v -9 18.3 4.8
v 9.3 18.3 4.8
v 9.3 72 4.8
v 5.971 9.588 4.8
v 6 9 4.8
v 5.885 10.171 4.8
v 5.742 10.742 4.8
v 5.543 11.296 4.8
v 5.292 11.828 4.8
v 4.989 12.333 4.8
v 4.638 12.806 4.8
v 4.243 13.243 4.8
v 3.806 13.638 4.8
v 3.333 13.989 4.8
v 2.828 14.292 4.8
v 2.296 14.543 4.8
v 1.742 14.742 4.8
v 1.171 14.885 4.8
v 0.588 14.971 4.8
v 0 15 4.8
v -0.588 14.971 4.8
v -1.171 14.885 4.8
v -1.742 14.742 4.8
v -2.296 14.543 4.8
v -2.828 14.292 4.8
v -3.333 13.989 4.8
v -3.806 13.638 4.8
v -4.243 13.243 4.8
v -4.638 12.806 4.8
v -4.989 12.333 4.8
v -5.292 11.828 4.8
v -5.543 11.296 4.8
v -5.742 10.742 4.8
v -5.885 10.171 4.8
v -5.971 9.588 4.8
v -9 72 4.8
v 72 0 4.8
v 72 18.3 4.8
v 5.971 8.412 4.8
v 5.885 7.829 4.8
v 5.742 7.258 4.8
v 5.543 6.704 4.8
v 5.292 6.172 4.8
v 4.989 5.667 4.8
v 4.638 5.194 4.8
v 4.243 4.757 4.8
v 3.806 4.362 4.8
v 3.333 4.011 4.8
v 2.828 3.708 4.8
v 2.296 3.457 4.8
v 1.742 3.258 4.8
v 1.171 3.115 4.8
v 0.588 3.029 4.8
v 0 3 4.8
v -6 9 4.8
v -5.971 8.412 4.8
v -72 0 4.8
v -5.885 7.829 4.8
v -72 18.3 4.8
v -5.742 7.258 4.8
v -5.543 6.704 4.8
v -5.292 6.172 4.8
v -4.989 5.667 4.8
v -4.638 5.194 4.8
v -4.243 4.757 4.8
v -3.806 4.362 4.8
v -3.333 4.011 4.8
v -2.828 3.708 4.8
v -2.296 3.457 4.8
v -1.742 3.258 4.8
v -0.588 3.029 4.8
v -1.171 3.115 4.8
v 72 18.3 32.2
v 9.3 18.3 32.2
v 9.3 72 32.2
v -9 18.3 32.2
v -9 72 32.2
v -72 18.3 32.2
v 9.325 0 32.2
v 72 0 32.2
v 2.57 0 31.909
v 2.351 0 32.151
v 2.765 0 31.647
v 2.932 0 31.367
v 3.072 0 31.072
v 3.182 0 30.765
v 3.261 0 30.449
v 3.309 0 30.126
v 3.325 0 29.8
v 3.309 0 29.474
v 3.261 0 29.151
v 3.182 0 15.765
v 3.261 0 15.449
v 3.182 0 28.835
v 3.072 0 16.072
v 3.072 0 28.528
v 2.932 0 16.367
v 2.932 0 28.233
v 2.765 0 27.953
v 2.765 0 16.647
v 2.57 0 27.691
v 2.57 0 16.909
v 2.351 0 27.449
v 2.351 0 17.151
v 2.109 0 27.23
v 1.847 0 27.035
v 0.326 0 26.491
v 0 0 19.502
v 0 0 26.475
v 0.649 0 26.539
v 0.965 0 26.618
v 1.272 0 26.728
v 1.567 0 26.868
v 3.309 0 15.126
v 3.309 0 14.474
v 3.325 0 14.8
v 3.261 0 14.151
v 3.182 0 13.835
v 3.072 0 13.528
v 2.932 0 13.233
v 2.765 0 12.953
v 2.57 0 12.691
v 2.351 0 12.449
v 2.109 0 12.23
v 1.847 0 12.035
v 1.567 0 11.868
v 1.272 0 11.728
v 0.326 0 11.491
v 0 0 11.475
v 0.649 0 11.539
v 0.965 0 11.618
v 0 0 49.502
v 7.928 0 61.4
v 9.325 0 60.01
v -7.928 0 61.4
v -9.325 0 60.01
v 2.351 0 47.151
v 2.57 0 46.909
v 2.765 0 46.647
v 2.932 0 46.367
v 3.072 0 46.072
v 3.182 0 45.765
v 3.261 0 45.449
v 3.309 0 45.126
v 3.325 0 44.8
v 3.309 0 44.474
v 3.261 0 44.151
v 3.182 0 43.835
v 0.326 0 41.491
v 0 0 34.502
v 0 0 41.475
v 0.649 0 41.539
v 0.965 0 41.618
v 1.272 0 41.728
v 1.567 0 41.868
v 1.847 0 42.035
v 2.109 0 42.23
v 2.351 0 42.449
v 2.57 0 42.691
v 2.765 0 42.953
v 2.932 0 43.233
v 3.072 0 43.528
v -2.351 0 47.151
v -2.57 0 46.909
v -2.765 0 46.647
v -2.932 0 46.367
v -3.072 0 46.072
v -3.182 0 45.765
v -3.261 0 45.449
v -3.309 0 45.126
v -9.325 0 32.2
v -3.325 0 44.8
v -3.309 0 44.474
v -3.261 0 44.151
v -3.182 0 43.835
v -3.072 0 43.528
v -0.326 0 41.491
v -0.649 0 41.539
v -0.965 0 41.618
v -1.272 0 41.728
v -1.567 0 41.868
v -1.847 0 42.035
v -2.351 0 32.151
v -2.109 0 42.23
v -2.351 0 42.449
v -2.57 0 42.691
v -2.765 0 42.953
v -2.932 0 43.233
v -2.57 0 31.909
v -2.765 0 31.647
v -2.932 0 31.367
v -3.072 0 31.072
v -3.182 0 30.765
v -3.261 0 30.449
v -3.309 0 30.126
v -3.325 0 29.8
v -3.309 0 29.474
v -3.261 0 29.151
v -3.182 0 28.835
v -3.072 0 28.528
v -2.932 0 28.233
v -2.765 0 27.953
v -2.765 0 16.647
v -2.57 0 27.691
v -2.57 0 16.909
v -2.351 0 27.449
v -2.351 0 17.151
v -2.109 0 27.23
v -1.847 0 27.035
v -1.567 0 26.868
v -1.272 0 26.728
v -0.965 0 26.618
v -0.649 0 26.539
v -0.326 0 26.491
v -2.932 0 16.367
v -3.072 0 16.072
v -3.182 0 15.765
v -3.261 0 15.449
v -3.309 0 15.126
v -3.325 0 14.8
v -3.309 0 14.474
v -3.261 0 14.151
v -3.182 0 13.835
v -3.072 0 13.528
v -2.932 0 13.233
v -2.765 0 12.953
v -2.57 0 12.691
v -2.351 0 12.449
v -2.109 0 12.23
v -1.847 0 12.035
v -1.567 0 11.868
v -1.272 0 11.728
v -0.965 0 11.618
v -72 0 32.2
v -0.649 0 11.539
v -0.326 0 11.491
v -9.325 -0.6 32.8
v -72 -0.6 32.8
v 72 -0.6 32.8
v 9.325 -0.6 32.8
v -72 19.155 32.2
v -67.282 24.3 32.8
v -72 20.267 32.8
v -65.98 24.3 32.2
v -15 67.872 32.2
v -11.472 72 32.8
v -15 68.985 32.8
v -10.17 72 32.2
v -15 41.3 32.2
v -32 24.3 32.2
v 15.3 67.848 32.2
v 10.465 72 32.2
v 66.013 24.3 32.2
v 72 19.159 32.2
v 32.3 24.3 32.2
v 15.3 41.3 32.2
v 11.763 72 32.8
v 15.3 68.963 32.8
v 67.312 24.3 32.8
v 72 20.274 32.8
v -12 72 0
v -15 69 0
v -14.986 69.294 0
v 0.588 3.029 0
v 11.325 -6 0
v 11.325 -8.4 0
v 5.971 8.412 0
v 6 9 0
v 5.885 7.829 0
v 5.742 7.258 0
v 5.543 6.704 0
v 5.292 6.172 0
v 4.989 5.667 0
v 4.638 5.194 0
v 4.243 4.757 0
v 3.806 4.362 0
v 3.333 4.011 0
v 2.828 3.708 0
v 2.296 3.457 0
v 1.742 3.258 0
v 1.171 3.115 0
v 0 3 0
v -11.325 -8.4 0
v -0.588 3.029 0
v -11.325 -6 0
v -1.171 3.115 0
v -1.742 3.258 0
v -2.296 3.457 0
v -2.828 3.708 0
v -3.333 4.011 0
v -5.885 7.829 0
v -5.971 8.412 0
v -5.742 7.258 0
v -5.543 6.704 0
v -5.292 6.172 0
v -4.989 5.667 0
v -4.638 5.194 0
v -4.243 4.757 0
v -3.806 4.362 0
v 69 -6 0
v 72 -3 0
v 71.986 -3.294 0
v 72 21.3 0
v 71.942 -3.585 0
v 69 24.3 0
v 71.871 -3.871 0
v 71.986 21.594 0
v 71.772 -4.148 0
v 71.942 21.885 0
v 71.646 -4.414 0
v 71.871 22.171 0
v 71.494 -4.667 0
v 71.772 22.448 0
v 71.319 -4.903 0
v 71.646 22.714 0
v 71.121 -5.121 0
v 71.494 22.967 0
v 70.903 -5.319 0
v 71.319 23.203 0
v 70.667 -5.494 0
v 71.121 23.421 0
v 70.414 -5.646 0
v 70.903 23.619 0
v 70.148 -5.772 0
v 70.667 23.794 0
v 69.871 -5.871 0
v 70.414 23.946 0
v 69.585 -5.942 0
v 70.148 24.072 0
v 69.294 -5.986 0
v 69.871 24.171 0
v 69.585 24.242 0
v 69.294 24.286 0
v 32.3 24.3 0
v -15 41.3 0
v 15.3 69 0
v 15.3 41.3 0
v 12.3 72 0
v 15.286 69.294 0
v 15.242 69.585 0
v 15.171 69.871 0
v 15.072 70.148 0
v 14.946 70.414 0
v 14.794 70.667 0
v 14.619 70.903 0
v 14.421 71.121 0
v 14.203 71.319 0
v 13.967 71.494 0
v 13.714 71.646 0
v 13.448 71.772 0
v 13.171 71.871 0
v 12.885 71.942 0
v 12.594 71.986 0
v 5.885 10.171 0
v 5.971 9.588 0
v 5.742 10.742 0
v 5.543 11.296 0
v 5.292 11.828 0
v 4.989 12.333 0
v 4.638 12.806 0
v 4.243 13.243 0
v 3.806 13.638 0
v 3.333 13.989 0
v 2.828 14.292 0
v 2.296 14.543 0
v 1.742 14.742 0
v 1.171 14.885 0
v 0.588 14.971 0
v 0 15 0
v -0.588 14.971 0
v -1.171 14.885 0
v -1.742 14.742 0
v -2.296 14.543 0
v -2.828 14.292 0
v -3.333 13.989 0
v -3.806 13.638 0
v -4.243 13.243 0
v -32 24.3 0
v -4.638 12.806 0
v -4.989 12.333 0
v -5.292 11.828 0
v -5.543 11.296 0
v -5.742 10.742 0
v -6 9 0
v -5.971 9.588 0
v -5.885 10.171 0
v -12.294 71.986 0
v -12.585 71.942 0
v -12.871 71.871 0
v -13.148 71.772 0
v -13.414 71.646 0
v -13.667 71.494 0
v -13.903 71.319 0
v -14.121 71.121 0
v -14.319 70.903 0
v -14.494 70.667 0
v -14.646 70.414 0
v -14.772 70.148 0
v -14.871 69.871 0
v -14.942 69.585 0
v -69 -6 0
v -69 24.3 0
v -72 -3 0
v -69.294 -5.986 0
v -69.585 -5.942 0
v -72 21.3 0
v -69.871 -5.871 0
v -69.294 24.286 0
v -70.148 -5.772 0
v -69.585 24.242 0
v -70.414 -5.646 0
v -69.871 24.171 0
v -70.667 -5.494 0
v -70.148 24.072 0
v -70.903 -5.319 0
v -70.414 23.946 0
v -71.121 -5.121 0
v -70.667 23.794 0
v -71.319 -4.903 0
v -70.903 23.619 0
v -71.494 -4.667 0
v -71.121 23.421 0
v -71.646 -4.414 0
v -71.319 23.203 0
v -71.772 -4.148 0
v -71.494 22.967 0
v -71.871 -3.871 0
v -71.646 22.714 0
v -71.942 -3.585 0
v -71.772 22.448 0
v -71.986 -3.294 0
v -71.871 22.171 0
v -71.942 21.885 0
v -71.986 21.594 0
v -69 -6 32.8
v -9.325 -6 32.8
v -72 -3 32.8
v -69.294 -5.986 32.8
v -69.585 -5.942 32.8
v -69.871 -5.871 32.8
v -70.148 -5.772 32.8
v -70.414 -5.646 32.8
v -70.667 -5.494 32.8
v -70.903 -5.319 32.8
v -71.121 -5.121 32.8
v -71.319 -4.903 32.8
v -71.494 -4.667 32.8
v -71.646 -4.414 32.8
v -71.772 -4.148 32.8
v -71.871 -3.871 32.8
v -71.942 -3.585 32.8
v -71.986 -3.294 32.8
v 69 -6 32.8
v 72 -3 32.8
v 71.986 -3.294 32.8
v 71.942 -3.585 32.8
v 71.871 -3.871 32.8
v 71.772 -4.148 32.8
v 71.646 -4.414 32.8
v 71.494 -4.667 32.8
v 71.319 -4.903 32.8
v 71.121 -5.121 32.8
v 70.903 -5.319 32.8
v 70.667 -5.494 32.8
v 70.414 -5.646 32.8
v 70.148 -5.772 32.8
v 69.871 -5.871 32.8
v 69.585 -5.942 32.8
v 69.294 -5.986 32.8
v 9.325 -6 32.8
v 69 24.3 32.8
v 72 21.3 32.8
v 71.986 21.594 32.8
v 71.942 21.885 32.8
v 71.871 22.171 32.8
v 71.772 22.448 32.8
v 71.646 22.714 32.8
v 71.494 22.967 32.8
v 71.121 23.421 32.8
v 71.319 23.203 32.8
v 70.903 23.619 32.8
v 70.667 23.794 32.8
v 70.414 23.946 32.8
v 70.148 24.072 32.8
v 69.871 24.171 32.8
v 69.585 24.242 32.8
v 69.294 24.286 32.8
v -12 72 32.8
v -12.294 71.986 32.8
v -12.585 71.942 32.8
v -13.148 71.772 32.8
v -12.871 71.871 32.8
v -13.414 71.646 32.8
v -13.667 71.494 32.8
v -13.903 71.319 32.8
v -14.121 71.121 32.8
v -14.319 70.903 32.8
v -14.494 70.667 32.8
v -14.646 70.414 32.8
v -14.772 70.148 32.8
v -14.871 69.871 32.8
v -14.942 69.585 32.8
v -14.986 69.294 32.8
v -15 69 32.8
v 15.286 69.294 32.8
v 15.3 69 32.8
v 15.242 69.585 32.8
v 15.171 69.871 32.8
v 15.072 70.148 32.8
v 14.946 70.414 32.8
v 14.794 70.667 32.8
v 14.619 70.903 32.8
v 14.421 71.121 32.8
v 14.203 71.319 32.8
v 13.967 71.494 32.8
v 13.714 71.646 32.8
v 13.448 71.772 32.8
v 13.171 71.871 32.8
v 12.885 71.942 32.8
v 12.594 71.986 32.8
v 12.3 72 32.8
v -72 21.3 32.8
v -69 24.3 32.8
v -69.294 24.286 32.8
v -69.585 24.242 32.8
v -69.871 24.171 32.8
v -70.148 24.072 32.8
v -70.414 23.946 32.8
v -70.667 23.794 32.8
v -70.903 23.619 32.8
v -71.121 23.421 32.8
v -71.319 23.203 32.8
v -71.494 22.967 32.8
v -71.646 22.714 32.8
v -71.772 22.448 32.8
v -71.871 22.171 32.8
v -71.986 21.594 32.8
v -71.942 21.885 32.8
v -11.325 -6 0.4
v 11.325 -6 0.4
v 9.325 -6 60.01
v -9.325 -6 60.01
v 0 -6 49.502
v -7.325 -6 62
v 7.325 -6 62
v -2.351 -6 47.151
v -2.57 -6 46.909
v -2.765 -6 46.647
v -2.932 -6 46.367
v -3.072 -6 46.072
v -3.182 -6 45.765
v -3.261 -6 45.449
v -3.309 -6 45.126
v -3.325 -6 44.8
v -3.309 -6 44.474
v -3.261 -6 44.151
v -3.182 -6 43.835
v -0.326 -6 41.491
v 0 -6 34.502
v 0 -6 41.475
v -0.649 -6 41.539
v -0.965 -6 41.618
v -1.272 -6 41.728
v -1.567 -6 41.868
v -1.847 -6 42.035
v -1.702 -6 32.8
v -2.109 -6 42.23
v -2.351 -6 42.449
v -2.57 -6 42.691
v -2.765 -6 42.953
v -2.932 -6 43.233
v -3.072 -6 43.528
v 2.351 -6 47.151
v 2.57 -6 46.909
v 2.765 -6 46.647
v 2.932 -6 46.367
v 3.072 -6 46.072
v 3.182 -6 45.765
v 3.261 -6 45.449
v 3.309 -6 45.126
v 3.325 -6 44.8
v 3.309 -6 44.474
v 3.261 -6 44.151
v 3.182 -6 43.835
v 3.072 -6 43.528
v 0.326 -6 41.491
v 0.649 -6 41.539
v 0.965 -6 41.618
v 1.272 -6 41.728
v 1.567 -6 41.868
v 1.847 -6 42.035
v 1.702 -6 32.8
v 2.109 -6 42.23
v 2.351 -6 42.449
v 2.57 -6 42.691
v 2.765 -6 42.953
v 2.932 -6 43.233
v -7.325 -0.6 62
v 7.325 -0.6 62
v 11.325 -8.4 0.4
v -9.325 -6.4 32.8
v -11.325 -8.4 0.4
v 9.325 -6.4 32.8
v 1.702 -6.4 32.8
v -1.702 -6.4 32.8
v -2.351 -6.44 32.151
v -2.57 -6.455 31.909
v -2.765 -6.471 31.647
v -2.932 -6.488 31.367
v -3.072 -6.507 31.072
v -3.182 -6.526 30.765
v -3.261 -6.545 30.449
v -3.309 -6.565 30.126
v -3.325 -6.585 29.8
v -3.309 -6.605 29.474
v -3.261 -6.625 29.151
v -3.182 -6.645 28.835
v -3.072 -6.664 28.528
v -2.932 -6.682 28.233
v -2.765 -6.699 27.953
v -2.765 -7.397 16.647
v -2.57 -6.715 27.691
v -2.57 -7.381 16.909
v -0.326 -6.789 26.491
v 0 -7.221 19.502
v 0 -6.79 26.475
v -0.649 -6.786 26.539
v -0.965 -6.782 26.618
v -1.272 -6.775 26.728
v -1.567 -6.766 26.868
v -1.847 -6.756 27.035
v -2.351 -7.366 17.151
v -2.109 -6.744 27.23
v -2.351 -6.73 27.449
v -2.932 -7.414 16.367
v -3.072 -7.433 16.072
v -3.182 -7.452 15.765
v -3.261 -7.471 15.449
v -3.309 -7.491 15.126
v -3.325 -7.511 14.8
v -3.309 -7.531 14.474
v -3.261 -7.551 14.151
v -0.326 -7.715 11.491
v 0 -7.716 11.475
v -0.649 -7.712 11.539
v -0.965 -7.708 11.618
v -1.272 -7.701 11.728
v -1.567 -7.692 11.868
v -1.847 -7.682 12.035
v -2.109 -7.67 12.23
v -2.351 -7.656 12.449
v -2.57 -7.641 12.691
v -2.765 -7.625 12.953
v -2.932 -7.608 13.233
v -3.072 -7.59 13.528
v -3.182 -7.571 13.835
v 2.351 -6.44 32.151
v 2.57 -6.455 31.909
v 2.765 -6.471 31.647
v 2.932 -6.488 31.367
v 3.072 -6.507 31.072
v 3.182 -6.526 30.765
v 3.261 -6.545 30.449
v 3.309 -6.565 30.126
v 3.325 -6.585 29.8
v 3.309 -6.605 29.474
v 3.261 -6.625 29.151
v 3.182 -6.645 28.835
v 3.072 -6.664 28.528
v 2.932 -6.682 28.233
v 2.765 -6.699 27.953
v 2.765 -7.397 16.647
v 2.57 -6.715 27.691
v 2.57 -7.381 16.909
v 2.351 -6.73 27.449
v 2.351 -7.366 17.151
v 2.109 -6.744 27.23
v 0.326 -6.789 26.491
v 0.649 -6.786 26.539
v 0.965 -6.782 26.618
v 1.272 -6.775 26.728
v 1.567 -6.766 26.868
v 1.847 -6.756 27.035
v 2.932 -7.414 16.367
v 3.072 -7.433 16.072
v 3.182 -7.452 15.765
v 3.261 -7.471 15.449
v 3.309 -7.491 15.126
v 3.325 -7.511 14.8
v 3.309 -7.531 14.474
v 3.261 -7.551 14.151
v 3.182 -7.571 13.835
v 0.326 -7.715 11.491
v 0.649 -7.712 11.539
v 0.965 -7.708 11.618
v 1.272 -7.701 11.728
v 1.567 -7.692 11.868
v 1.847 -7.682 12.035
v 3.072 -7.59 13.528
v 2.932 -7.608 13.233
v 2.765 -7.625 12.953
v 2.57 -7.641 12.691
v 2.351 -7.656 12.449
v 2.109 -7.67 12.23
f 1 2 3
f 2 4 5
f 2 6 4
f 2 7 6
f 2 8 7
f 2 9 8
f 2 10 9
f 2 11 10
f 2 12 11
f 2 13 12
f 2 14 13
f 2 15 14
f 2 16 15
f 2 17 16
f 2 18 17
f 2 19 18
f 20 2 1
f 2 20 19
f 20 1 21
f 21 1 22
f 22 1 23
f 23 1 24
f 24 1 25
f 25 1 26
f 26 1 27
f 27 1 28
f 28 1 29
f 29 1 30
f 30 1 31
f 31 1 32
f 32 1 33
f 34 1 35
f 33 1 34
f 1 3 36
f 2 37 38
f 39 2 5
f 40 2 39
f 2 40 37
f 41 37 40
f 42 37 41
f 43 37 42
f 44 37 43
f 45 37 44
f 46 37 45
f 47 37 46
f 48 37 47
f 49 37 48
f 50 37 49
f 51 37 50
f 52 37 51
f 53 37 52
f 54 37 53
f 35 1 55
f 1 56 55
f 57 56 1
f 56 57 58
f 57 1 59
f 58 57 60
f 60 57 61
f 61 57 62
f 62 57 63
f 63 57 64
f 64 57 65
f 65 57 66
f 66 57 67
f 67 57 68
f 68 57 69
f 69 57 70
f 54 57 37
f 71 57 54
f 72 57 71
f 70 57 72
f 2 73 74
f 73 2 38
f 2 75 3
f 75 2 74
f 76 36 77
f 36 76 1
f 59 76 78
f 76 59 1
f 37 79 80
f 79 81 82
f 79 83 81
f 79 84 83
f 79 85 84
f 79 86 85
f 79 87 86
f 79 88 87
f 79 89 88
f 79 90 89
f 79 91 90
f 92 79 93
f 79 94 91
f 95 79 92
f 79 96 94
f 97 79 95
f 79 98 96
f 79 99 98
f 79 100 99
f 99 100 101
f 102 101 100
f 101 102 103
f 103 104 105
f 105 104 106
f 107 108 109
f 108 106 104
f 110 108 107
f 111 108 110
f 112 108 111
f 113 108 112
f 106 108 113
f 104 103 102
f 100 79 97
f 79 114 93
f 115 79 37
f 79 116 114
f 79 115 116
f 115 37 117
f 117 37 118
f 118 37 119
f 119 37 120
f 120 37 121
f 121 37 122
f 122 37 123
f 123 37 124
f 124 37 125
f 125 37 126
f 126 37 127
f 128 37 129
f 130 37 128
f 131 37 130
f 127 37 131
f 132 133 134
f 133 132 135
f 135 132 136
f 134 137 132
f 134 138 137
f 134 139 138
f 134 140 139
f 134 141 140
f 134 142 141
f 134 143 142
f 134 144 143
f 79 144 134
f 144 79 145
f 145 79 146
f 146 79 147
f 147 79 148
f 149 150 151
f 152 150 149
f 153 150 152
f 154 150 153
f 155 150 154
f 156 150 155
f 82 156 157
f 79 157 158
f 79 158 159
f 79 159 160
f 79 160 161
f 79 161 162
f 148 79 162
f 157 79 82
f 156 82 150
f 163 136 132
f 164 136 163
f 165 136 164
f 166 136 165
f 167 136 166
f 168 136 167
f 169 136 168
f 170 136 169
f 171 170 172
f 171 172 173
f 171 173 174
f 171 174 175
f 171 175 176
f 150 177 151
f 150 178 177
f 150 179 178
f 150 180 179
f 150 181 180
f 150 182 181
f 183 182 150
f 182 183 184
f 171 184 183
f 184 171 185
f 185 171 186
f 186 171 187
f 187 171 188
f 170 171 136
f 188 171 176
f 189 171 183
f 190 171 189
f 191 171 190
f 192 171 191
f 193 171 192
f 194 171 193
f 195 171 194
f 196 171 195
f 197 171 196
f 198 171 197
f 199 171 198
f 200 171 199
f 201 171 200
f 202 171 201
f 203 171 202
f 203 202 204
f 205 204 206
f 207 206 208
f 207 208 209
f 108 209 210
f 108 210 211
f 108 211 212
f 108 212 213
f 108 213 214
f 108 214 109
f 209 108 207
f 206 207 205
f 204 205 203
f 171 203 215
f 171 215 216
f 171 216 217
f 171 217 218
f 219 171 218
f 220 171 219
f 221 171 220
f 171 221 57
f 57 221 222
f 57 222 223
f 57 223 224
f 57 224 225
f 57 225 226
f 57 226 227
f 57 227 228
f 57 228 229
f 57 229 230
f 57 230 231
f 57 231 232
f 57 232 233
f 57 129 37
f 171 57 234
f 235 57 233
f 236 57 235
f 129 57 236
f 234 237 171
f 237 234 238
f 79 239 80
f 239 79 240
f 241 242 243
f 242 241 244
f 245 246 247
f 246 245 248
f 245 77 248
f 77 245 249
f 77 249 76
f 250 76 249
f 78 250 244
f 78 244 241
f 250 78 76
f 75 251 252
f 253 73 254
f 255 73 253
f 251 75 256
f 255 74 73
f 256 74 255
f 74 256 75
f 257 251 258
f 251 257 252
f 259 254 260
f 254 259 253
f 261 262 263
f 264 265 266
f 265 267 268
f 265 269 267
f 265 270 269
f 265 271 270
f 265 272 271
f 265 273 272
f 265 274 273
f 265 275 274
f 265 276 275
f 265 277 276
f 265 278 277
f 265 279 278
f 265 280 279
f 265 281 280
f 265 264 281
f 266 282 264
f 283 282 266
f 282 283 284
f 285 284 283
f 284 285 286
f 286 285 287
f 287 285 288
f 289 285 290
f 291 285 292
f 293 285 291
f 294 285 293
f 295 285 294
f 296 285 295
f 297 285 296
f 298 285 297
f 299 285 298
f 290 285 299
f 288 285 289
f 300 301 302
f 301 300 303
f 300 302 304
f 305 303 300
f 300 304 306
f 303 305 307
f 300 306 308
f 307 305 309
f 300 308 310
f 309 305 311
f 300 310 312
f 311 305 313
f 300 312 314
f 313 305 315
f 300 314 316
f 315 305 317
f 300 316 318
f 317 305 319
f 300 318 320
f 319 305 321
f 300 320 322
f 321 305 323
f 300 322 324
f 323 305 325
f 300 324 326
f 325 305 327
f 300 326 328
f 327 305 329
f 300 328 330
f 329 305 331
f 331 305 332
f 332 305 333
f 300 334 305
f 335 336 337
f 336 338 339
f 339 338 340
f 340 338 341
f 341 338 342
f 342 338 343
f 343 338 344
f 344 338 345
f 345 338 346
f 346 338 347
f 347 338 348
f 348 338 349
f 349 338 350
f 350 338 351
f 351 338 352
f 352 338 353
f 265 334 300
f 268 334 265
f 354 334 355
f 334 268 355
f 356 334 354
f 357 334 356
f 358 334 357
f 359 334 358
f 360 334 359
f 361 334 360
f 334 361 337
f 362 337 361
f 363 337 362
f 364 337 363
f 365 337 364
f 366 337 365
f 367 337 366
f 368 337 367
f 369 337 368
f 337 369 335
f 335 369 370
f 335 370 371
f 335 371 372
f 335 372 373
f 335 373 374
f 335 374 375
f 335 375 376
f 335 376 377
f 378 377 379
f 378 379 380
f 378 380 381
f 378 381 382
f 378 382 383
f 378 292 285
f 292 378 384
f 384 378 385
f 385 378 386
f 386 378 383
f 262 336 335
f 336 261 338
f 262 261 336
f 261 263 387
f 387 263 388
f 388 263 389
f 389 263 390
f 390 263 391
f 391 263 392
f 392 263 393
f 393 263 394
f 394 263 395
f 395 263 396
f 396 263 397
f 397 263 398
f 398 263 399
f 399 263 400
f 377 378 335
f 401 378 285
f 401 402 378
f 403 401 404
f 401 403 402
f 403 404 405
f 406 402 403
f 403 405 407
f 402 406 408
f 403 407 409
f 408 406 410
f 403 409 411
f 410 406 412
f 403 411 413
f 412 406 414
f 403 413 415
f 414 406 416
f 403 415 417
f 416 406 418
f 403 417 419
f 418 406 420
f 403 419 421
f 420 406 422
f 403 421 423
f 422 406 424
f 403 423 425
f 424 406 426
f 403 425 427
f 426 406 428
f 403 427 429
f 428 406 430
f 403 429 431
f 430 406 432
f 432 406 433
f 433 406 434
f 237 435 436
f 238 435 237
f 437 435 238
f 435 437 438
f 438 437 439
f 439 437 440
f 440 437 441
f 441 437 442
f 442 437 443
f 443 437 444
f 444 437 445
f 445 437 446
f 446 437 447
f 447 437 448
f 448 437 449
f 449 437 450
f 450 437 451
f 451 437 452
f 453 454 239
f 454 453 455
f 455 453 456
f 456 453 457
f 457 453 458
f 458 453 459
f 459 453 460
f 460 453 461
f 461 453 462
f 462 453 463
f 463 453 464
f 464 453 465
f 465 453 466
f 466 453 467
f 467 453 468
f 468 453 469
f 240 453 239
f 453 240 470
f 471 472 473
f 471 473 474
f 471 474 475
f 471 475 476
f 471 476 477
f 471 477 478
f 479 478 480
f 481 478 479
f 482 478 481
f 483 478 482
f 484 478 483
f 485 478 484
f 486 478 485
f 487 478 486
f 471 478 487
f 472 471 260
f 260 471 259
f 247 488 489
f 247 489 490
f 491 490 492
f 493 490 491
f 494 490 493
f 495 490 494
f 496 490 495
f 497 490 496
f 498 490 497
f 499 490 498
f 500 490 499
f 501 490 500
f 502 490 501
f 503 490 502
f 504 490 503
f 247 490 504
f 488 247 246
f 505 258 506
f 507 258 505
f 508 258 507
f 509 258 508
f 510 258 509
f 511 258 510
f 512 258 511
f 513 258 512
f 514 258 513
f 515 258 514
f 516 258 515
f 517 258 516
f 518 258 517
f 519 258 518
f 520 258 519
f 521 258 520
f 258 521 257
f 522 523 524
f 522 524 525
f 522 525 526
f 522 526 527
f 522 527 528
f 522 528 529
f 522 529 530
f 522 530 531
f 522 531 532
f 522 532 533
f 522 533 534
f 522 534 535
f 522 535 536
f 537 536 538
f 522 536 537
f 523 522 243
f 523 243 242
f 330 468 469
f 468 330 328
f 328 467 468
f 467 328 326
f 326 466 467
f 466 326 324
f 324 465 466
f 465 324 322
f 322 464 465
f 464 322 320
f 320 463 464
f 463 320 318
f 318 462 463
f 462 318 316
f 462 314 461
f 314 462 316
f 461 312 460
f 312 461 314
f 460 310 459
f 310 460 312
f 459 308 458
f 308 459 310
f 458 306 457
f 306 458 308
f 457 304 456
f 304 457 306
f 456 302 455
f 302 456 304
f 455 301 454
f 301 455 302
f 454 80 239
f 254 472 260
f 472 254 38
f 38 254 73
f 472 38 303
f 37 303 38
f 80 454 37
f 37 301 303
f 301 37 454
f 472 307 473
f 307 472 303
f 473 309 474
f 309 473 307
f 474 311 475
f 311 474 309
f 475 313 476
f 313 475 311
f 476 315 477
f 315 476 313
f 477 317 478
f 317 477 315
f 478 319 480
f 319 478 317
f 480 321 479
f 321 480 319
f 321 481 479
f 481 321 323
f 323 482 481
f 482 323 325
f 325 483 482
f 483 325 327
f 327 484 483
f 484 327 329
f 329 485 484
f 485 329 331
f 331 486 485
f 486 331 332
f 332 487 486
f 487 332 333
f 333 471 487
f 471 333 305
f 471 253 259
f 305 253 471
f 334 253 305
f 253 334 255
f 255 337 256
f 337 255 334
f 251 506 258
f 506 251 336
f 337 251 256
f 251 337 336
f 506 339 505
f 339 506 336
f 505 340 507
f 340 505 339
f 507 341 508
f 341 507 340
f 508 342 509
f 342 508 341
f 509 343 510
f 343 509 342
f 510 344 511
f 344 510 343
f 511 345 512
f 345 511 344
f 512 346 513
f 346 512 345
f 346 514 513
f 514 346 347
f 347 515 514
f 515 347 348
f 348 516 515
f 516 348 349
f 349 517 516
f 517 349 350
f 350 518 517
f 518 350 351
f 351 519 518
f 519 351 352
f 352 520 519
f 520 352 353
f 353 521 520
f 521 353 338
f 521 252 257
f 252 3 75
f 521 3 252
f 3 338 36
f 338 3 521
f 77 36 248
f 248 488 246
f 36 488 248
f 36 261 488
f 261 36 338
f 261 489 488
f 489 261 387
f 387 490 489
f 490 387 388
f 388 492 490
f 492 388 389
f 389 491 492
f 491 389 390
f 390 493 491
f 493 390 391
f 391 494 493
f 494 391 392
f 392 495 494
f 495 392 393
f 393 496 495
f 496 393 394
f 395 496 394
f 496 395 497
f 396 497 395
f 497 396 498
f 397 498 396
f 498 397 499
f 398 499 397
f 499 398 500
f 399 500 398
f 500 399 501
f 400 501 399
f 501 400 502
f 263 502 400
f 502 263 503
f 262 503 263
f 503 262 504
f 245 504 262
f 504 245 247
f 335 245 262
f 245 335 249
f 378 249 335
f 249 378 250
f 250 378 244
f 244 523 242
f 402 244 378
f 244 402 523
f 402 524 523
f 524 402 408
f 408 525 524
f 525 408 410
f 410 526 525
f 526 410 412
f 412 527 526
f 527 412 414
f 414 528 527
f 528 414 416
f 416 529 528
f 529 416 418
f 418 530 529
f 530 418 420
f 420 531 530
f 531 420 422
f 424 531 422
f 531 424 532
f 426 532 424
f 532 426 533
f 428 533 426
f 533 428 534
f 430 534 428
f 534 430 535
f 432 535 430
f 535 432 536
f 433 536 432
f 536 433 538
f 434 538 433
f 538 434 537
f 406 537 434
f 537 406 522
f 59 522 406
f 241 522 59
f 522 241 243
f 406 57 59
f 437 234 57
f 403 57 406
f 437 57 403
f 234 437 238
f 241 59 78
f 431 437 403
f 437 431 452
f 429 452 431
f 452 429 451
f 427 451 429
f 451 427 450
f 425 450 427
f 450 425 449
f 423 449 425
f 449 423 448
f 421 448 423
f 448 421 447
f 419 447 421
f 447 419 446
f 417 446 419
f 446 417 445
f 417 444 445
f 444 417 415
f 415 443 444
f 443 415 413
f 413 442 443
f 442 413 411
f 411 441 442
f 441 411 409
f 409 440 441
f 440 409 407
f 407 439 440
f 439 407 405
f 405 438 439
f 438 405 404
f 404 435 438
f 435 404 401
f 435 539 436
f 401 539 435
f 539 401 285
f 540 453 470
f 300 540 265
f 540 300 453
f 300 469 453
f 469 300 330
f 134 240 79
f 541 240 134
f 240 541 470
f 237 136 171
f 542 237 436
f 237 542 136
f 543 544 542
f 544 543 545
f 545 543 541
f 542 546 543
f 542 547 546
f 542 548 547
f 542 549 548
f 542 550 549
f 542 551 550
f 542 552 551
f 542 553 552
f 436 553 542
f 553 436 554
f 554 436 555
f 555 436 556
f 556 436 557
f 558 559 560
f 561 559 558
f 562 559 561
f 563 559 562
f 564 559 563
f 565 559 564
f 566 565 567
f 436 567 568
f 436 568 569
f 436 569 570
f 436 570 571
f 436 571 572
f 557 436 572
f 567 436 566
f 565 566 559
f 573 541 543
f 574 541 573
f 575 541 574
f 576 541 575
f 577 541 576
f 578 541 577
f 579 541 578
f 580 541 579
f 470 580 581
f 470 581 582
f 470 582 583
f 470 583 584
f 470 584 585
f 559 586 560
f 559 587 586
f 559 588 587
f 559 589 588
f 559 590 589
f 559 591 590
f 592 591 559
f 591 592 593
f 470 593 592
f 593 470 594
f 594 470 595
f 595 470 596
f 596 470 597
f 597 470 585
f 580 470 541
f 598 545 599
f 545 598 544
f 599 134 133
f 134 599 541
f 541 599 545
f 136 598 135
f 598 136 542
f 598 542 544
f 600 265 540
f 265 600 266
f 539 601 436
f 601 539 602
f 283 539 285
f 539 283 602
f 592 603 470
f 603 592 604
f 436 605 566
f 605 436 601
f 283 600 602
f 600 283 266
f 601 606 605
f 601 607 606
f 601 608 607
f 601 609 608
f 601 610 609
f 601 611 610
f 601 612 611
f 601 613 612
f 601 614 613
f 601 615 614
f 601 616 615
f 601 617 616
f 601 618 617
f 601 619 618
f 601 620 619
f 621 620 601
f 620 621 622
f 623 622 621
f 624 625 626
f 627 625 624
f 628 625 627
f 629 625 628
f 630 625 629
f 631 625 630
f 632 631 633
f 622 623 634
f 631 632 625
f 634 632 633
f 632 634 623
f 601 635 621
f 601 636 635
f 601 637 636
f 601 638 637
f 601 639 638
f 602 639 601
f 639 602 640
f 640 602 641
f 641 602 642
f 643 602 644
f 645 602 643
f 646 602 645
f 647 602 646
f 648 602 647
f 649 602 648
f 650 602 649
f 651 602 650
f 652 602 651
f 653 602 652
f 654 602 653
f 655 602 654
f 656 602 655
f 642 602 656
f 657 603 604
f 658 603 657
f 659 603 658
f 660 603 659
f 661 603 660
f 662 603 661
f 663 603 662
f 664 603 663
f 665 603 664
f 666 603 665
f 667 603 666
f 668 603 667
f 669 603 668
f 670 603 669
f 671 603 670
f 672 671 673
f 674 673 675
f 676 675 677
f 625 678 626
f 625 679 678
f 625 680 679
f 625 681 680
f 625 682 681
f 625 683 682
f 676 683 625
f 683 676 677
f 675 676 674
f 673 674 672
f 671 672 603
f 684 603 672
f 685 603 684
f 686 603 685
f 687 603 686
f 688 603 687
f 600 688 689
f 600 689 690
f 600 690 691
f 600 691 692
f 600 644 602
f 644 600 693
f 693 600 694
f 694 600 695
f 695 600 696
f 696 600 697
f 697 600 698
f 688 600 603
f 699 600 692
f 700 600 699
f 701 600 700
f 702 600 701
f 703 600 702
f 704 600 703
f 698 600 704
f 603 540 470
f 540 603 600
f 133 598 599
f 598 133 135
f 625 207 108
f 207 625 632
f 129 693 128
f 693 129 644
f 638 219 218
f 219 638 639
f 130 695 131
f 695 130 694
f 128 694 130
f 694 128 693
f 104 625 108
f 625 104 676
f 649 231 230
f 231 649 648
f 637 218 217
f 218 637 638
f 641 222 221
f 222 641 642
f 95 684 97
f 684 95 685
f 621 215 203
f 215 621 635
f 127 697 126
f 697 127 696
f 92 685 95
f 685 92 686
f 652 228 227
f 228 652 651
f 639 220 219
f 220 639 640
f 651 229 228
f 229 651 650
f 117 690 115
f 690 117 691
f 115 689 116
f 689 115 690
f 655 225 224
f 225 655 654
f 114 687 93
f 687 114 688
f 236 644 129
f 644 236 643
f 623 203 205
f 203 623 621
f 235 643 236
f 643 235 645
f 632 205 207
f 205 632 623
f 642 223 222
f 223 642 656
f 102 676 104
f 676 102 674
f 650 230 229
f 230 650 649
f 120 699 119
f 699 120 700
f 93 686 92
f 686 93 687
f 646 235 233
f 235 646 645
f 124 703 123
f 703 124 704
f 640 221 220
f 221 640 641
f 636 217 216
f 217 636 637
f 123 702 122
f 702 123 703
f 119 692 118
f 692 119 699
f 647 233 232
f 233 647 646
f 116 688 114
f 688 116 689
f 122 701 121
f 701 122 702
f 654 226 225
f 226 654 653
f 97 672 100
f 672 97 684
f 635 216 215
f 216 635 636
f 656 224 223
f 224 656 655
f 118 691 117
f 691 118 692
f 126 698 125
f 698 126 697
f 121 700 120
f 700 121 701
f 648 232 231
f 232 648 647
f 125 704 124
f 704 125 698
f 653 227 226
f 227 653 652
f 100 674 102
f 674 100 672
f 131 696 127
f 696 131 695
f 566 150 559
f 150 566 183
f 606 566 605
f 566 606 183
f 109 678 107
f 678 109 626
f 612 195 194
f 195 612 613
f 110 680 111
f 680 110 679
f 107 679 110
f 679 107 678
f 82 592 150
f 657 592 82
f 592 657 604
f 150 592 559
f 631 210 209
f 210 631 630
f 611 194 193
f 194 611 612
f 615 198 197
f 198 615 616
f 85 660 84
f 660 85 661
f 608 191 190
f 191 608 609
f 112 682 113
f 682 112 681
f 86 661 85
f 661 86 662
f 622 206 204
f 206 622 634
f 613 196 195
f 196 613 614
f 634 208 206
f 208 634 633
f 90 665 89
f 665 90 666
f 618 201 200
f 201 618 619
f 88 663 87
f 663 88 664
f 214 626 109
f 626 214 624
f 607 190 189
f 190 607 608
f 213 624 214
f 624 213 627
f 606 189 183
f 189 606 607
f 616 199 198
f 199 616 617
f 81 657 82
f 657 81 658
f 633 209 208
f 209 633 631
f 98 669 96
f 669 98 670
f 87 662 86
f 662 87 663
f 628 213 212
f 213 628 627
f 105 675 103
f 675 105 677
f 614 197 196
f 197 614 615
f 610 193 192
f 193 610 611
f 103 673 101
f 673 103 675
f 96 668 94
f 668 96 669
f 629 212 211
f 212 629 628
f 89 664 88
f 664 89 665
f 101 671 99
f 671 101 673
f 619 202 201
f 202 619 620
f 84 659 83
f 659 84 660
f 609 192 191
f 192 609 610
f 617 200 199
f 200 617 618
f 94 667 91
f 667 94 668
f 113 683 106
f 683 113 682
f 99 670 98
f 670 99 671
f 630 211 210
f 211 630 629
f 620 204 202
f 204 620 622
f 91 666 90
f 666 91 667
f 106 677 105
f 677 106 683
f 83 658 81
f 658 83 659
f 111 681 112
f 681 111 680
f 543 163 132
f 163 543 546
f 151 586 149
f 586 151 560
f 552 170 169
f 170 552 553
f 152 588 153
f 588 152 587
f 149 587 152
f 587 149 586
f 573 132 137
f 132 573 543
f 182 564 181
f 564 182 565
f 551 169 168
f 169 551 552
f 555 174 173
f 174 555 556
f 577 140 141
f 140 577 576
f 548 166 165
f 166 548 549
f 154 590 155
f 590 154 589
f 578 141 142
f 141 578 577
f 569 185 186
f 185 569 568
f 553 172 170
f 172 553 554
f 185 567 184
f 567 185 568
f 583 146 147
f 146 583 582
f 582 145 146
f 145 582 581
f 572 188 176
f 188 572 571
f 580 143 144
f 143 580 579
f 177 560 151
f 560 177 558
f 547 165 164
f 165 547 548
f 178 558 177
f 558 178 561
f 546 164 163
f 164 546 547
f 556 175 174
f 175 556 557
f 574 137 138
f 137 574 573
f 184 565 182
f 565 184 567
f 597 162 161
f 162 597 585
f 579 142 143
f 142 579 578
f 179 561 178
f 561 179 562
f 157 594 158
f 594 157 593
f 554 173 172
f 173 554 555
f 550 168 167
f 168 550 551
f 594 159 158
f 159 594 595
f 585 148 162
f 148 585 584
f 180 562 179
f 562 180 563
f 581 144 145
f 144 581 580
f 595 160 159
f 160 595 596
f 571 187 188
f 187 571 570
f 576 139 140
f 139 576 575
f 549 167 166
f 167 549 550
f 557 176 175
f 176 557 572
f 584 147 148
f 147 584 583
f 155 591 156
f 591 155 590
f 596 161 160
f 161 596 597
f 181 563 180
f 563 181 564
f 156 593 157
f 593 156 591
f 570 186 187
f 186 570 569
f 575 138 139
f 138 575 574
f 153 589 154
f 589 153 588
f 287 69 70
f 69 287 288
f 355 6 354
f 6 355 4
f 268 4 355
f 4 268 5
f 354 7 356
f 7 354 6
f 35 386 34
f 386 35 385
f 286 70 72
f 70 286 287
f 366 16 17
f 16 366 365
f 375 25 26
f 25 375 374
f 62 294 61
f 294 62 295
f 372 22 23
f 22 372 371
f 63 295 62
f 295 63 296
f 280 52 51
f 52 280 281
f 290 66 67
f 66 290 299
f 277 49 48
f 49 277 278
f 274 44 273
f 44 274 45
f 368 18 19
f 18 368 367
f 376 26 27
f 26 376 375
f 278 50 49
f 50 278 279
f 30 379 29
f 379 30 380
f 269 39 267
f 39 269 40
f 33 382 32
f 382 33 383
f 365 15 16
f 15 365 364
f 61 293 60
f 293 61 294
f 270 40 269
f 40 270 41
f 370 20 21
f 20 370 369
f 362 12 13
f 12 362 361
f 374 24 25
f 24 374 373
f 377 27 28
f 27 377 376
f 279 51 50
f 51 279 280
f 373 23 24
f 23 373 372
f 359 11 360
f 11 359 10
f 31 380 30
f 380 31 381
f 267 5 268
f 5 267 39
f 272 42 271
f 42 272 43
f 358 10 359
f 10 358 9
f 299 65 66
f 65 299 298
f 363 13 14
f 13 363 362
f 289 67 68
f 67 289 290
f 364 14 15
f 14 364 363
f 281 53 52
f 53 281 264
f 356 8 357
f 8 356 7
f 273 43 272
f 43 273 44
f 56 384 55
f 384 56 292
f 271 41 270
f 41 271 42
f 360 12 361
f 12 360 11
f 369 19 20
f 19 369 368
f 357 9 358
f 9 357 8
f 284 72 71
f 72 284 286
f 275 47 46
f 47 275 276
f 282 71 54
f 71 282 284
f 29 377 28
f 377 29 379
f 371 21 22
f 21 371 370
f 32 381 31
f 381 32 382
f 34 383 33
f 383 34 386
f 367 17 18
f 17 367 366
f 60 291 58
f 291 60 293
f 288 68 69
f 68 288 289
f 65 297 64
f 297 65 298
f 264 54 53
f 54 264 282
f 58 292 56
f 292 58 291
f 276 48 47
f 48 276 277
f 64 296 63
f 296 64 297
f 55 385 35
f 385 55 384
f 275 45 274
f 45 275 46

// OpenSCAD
// file: common.scad
// Wspolna geometria. Uklad druku: mostek na Z=0, szczeliny otwarte ku +Z.
// W uzyciu nasadke odwraca sie: mostek lezy na gornych krawedziach plyt.
function choose(v,a,b,c) = v=="standard" ? a : v=="reinforced" ? b : c;
function al() = arm_length>0 ? arm_length : choose(variant,70,72,52);
function wt() = wall_thickness>0 ? wall_thickness : choose(variant,5,6,4.4);
function bh() = body_height>0 ? body_height : choose(variant,24,28,20);
function bt() = base_thickness>0 ? base_thickness : choose(variant,3.6,4.8,3.2);
function gh() = guide_height>0 ? guide_height : choose(variant,58,62,52);
function gs() = reinforcement_size>0 ? reinforcement_size : choose(variant,11,17,7);
function rd() = variant=="reinforced" ? 2.4 : 0;
function margin() = wt()+rd();
function slot() = board_thickness+clearance;
function tw() = max(board_thickness,guide_hole_diameter+2*wt());
function top_hole() = bt()+guide_first_offset+(guide_hole_count-1)*guide_hole_spacing;
function footprint_depth() = al()+margin();

module check_parameters() {
    assert(variant=="standard" || variant=="reinforced" || variant=="compact", "Nieznany wariant");
    assert(board_thickness>=12 && clearance>=0 && clearance<=1, "Sprawdz grubosc plyty i luz");
    assert(wt()>=3.6 && bt()>=2.8 && bh()>2*lead_in, "Zbyt cienkie scianki / mostek");
    assert(lead_in>=0 && lead_in<wt()/2 && corner_radius>0 && corner_radius<wt(), "Bledny promien / faza");
    assert(al()>slot()+wt()+gs()+4, "Za krotkie ramiona dla tych parametrow");
    assert(guide_hole_diameter>0 && guide_hole_spacing>guide_hole_diameter*1.21+3, "Za maly mostek miedzy otworami");
    assert(guide_hole_count>=1 && guide_hole_count==floor(guide_hole_count), "Liczba otworow musi byc calkowita");
    assert(gh()>top_hole()+guide_hole_diameter/sqrt(2)+4 && gh()>bt()+bh(), "Za niska wieza otworow");
    assert(inspection_diameter<slot()-4, "Za duze okno kontrolne");
    children();
}

module rect(x,y,w,h) { translate([x,y]) square([w,h]); }

// Erozja i dylatacja zaokraglaja wypukle krawedzie, zachowujac gabaryt.
module rounded_outer() { offset(r=corner_radius) offset(delta=-corner_radius) children(); }

module raw_outer(kind) {
    a=al(); w=wt(); s=slot(); t=board_thickness; g=gs();
    if(kind=="TL") {
        rect(-a,-w,2*a,s+2*w);
        rect(-t/2-w,s, s+2*w,a-s);
        for(side=[-1,1]) translate([side<0 ? -t/2-w : t/2+clearance+w,s+w])
            scale([side,1]) polygon([[0,0],[g,0],[0,g]]);
    } else {
        rect(-w,-w,a+w,s+2*w);
        rect(-w,-w,s+2*w,a+w);
        translate([s+w,s+w]) polygon([[0,0],[g,0],[0,g]]);
    }
}

module outer(kind) { rounded_outer() union() raw_outer(kind); }

// Wazne: szczeliny nie sa zaokraglane do srodka. Prostokatna plyta
// moze dojsc do mostka bez kolizji z promieniem lub zebrem.
module slots_2d(kind, extra=0) {
    a=al(); s=slot(); t=board_thickness; e=1;
    offset(delta=extra) union() {
        if(kind=="TL") {
            rect(-a-e,0,2*a+2*e,s);
            rect(-t/2,t,s,a-t+e);
        } else {
            rect(0,0,a+e,s);
            rect(0,0,s,a+e);
        }
    }
}

module slot_cut(kind, height, mouth=true) {
    translate([0,0,bt()]) linear_extrude(height=height-bt()+1) slots_2d(kind);
    if(mouth && lead_in>0) {
        // Hull dwoch przekrojow daje faze bez podpory, material ubywa ku gorze.
        hull() {
            translate([0,0,height-lead_in]) linear_extrude(.01) slots_2d(kind);
            translate([0,0,height]) linear_extrude(.01) slots_2d(kind,lead_in);
        }
    }
}

module inspection(kind) {
    if(include_inspection_windows) {
        if(kind=="TL") translate([0,board_thickness/2,-1])
            cylinder(h=bt()+2,d=inspection_diameter);
        else for(axis=[0,1]) rotate([0,0,90*axis])
            // Obracamy wzgledem dodatniego naroznika przez zamiane X/Y.
            if(axis==0) hull() for(x=[board_thickness/2,al()-12])
                translate([x,board_thickness/2,-1]) cylinder(h=bt()+2,d=board_thickness/3);
            else hull() for(x=[board_thickness/2,al()-12])
                translate([x,-board_thickness/2,-1]) cylinder(h=bt()+2,d=board_thickness/3);
    }
}

module tower_one(kind) {
    x=kind=="TL" ? -tw()/2 : 0;
    // Wieza opiera sie cala dlugoscia na mostku i zewnetrznej sciance.
    translate([x,-wt(),0]) cube([tw(),wt(),gh()-2]);
    hull() {
        translate([x,-wt(),gh()-2.01]) cube([tw(),wt(),.02]);
        translate([x+2,-wt(),gh()-.02]) cube([tw()-4,wt(),.02]);
    }
    if(rd()>0) hull() {
        translate([x-2,-margin(),0]) cube([tw()+4,rd()+.02,.4]);
        translate([x,-wt()-.4,bt()+bh()-.4]) cube([tw(),.42,.4]);
    }
}

module tower(kind) {
    tower_one(kind);
    if(kind=="LL") {
        rotate([0,0,90]) mirror([0,1,0]) tower_one(kind);
        // Ciagly narozny slup: dwie wysokie scianki musza laczyc sie
        // powierzchnia, nie tylko krawedzia (wymog bryly manifold).
        linear_extrude(height=gh()) intersection() {
            rect(-wt(),-wt(),wt(),wt());
            circle(r=wt());
        }
    }
}

module hole_profile() {
    r=guide_hole_diameter/2;
    union() {
        circle(r=r);
        if(support_free_holes) polygon([[-r/sqrt(2),r/sqrt(2)],[0,r*sqrt(2)],[r/sqrt(2),r/sqrt(2)]]);
    }
}

module holes_one(kind) {
    x=kind=="TL" ? 0 : board_thickness/2;
    if(include_guide_holes) for(i=[0:guide_hole_count-1])
        translate([x,1,bt()+guide_first_offset+i*guide_hole_spacing])
            rotate([90,0,0]) linear_extrude(height=margin()+2) hole_profile();
}

module holes(kind) {
    holes_one(kind);
    if(kind=="LL") rotate([0,0,90]) mirror([0,1,0]) holes_one(kind);
}

module handle(kind) {
    check_parameters() difference() {
        union() {
            difference() {
                linear_extrude(height=bt()+bh()) outer(kind);
                slot_cut(kind,bt()+bh());
            }
            difference() {
                tower(kind);
                slot_cut(kind,gh());
            }
        }
        holes(kind);
        inspection(kind);
    }
}

// Prawdziwe polaczenie doczolowe: plyty stykaja sie, nie przenikaja.
module board_A(kind, length=85, height=95, thickness=board_thickness) {
    t=thickness;
    translate([kind=="TL" ? -length : 0,0,bt()])
        cube([kind=="TL" ? 2*length : length,t,height]);
}
module board_B(kind, length=85, height=95, thickness=board_thickness) {
    t=thickness;
    translate([kind=="TL" ? -t/2 : 0,t,bt()]) cube([t,length-t,height]);
}
module boards(kind, length=85, height=95, thickness=board_thickness) {
    board_A(kind,length,height,thickness);
    board_B(kind,length,height,thickness);
}

module fit_coupon(c=fit_clearance) {
    w=5; b=3.2; h=20; s=board_thickness+c; length=24;
    difference() {
        union() {
            translate([0,-w,0]) cube([length,s+2*w,b+h]);
            translate([length-.1,-w,0]) cube([15.1,8,b]);
        }
        translate([-1,0,b]) cube([length+2,s,h+1]);
        if(lead_in>0) hull() {
            translate([-1,0,b+h-lead_in]) cube([length+2,s,.01]);
            translate([-1,-lead_in,b+h]) cube([length+2,s+2*lead_in,.01]);
        }
        translate([31.5,-1,b-.7]) linear_extrude(1)
            text(str(c),size=4,halign="center",valign="center",font="Liberation Sans:style=Bold");
    }
}
// file: config.scad
// Wszystkie wymiary w mm. 0 = wartosc dobrana dla wariantu.
variant = "reinforced"; // [standard,reinforced,compact]
board_thickness = 18;
clearance = 0.3;        // CALKOWITY luz; szczelina = t + clearance
arm_length = 0;        // LL: dlugosc kazdego ramienia; TL: polowa poprzeczki
wall_thickness = 0;
body_height = 0;       // wysokosc chwytu ponad mostkiem, bez wiezy otworow
base_thickness = 0;
guide_height = 0;      // calkowita wysokosc modelu od stolu
corner_radius = 3;     // zewnetrzne zaokraglenia XY
reinforcement_size = 0;
lead_in = 0.6;         // faza 45 stopni przy wlocie
guide_hole_diameter = 6.65;
guide_hole_spacing = 15;
guide_first_offset = 10; // od powierzchni mostka, os pierwszego otworu
guide_hole_count = 3;
include_guide_holes = true;
support_free_holes = true; // okrag wpisany + daszek 45 stopni
include_inspection_windows = true;
inspection_diameter = 12;
plate_number = 1;       // 1 i 2: po 1 TL + 2 LL = caly zestaw
fit_clearance = 0.3;
$fn = 64;
// main file
include <config.scad>
include <common.scad>
// Otworz ten plik i nacisnij F6; wariant wybierz w config.scad lub przez -D.
handle("TL");
